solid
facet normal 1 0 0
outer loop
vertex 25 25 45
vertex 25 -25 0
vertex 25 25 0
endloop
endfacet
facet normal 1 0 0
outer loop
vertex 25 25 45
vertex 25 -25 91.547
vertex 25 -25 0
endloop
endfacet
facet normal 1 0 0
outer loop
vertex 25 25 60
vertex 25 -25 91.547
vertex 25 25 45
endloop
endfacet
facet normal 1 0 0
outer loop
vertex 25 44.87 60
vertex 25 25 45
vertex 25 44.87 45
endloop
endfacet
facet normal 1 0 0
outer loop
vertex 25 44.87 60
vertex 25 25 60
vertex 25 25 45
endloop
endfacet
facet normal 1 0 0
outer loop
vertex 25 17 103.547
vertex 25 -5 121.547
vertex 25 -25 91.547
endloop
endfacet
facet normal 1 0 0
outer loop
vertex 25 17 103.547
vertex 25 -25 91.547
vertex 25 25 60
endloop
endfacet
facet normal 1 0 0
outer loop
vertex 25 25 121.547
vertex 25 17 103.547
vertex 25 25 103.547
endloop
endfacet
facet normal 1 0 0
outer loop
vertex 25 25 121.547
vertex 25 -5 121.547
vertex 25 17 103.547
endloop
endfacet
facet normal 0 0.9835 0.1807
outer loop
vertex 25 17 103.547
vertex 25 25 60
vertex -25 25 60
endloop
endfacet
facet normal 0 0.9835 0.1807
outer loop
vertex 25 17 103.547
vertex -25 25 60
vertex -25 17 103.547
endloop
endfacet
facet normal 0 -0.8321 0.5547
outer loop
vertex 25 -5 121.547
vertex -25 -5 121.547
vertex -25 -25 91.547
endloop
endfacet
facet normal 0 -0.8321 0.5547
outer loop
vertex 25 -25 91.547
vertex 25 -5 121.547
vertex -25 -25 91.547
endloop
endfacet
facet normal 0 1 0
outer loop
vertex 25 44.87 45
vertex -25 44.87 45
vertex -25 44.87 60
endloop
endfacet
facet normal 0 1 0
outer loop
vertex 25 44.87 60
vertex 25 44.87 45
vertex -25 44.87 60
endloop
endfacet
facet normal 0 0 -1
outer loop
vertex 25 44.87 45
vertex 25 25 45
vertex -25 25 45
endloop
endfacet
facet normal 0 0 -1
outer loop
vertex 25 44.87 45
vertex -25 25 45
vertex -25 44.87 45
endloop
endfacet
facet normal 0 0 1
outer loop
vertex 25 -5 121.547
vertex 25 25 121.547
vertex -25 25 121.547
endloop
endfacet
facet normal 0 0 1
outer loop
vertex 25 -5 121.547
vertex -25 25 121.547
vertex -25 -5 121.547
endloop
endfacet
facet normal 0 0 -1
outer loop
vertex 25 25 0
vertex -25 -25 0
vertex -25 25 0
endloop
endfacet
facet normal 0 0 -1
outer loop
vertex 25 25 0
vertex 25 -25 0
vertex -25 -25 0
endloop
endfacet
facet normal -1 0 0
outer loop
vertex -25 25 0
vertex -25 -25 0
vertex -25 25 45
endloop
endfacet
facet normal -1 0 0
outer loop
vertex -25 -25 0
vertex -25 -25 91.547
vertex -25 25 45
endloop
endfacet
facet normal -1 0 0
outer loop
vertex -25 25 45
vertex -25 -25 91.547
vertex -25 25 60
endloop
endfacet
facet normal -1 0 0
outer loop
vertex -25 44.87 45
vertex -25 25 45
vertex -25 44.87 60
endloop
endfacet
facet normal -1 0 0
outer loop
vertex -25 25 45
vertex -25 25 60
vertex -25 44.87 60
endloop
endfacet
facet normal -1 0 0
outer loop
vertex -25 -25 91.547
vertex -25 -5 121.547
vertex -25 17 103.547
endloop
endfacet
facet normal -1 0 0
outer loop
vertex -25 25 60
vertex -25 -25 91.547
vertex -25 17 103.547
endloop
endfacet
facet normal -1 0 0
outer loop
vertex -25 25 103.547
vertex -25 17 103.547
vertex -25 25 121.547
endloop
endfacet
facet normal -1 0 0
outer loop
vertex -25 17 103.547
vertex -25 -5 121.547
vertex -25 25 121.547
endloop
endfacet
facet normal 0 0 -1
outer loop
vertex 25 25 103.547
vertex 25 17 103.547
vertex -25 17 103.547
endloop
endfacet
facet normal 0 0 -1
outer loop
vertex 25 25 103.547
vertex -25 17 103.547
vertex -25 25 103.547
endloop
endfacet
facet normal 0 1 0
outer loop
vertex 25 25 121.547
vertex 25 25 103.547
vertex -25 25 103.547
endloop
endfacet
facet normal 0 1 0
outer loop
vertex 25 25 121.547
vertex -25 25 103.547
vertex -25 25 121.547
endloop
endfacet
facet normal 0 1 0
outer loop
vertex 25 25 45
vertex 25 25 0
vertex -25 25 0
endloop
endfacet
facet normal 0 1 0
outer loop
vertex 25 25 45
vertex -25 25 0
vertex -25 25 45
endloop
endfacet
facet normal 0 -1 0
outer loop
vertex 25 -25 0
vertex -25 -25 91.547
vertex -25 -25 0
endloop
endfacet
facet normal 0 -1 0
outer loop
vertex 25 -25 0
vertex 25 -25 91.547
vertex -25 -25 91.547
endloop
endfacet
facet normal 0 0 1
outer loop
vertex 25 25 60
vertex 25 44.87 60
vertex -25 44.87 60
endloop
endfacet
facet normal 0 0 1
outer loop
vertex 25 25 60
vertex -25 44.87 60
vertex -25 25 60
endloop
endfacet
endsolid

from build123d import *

# Parameters (mm, degrees)
F1_DEPTH = 25


with BuildPart() as f1:
    # F0 (on Right) → F1 (new body, symmetric)
    with BuildSketch(Plane.YZ):
        Polygon((-25, 0), (25, 0), (25, 45), (44.870459, 45), (44.870459, 60), (25, 60), (17, 103.547319), (25, 103.547319), (25, 121.547319), (-5, 121.547319), (-25, 91.547319), align=None)
    extrude(amount=F1_DEPTH, both=True)


solid = f1.part
